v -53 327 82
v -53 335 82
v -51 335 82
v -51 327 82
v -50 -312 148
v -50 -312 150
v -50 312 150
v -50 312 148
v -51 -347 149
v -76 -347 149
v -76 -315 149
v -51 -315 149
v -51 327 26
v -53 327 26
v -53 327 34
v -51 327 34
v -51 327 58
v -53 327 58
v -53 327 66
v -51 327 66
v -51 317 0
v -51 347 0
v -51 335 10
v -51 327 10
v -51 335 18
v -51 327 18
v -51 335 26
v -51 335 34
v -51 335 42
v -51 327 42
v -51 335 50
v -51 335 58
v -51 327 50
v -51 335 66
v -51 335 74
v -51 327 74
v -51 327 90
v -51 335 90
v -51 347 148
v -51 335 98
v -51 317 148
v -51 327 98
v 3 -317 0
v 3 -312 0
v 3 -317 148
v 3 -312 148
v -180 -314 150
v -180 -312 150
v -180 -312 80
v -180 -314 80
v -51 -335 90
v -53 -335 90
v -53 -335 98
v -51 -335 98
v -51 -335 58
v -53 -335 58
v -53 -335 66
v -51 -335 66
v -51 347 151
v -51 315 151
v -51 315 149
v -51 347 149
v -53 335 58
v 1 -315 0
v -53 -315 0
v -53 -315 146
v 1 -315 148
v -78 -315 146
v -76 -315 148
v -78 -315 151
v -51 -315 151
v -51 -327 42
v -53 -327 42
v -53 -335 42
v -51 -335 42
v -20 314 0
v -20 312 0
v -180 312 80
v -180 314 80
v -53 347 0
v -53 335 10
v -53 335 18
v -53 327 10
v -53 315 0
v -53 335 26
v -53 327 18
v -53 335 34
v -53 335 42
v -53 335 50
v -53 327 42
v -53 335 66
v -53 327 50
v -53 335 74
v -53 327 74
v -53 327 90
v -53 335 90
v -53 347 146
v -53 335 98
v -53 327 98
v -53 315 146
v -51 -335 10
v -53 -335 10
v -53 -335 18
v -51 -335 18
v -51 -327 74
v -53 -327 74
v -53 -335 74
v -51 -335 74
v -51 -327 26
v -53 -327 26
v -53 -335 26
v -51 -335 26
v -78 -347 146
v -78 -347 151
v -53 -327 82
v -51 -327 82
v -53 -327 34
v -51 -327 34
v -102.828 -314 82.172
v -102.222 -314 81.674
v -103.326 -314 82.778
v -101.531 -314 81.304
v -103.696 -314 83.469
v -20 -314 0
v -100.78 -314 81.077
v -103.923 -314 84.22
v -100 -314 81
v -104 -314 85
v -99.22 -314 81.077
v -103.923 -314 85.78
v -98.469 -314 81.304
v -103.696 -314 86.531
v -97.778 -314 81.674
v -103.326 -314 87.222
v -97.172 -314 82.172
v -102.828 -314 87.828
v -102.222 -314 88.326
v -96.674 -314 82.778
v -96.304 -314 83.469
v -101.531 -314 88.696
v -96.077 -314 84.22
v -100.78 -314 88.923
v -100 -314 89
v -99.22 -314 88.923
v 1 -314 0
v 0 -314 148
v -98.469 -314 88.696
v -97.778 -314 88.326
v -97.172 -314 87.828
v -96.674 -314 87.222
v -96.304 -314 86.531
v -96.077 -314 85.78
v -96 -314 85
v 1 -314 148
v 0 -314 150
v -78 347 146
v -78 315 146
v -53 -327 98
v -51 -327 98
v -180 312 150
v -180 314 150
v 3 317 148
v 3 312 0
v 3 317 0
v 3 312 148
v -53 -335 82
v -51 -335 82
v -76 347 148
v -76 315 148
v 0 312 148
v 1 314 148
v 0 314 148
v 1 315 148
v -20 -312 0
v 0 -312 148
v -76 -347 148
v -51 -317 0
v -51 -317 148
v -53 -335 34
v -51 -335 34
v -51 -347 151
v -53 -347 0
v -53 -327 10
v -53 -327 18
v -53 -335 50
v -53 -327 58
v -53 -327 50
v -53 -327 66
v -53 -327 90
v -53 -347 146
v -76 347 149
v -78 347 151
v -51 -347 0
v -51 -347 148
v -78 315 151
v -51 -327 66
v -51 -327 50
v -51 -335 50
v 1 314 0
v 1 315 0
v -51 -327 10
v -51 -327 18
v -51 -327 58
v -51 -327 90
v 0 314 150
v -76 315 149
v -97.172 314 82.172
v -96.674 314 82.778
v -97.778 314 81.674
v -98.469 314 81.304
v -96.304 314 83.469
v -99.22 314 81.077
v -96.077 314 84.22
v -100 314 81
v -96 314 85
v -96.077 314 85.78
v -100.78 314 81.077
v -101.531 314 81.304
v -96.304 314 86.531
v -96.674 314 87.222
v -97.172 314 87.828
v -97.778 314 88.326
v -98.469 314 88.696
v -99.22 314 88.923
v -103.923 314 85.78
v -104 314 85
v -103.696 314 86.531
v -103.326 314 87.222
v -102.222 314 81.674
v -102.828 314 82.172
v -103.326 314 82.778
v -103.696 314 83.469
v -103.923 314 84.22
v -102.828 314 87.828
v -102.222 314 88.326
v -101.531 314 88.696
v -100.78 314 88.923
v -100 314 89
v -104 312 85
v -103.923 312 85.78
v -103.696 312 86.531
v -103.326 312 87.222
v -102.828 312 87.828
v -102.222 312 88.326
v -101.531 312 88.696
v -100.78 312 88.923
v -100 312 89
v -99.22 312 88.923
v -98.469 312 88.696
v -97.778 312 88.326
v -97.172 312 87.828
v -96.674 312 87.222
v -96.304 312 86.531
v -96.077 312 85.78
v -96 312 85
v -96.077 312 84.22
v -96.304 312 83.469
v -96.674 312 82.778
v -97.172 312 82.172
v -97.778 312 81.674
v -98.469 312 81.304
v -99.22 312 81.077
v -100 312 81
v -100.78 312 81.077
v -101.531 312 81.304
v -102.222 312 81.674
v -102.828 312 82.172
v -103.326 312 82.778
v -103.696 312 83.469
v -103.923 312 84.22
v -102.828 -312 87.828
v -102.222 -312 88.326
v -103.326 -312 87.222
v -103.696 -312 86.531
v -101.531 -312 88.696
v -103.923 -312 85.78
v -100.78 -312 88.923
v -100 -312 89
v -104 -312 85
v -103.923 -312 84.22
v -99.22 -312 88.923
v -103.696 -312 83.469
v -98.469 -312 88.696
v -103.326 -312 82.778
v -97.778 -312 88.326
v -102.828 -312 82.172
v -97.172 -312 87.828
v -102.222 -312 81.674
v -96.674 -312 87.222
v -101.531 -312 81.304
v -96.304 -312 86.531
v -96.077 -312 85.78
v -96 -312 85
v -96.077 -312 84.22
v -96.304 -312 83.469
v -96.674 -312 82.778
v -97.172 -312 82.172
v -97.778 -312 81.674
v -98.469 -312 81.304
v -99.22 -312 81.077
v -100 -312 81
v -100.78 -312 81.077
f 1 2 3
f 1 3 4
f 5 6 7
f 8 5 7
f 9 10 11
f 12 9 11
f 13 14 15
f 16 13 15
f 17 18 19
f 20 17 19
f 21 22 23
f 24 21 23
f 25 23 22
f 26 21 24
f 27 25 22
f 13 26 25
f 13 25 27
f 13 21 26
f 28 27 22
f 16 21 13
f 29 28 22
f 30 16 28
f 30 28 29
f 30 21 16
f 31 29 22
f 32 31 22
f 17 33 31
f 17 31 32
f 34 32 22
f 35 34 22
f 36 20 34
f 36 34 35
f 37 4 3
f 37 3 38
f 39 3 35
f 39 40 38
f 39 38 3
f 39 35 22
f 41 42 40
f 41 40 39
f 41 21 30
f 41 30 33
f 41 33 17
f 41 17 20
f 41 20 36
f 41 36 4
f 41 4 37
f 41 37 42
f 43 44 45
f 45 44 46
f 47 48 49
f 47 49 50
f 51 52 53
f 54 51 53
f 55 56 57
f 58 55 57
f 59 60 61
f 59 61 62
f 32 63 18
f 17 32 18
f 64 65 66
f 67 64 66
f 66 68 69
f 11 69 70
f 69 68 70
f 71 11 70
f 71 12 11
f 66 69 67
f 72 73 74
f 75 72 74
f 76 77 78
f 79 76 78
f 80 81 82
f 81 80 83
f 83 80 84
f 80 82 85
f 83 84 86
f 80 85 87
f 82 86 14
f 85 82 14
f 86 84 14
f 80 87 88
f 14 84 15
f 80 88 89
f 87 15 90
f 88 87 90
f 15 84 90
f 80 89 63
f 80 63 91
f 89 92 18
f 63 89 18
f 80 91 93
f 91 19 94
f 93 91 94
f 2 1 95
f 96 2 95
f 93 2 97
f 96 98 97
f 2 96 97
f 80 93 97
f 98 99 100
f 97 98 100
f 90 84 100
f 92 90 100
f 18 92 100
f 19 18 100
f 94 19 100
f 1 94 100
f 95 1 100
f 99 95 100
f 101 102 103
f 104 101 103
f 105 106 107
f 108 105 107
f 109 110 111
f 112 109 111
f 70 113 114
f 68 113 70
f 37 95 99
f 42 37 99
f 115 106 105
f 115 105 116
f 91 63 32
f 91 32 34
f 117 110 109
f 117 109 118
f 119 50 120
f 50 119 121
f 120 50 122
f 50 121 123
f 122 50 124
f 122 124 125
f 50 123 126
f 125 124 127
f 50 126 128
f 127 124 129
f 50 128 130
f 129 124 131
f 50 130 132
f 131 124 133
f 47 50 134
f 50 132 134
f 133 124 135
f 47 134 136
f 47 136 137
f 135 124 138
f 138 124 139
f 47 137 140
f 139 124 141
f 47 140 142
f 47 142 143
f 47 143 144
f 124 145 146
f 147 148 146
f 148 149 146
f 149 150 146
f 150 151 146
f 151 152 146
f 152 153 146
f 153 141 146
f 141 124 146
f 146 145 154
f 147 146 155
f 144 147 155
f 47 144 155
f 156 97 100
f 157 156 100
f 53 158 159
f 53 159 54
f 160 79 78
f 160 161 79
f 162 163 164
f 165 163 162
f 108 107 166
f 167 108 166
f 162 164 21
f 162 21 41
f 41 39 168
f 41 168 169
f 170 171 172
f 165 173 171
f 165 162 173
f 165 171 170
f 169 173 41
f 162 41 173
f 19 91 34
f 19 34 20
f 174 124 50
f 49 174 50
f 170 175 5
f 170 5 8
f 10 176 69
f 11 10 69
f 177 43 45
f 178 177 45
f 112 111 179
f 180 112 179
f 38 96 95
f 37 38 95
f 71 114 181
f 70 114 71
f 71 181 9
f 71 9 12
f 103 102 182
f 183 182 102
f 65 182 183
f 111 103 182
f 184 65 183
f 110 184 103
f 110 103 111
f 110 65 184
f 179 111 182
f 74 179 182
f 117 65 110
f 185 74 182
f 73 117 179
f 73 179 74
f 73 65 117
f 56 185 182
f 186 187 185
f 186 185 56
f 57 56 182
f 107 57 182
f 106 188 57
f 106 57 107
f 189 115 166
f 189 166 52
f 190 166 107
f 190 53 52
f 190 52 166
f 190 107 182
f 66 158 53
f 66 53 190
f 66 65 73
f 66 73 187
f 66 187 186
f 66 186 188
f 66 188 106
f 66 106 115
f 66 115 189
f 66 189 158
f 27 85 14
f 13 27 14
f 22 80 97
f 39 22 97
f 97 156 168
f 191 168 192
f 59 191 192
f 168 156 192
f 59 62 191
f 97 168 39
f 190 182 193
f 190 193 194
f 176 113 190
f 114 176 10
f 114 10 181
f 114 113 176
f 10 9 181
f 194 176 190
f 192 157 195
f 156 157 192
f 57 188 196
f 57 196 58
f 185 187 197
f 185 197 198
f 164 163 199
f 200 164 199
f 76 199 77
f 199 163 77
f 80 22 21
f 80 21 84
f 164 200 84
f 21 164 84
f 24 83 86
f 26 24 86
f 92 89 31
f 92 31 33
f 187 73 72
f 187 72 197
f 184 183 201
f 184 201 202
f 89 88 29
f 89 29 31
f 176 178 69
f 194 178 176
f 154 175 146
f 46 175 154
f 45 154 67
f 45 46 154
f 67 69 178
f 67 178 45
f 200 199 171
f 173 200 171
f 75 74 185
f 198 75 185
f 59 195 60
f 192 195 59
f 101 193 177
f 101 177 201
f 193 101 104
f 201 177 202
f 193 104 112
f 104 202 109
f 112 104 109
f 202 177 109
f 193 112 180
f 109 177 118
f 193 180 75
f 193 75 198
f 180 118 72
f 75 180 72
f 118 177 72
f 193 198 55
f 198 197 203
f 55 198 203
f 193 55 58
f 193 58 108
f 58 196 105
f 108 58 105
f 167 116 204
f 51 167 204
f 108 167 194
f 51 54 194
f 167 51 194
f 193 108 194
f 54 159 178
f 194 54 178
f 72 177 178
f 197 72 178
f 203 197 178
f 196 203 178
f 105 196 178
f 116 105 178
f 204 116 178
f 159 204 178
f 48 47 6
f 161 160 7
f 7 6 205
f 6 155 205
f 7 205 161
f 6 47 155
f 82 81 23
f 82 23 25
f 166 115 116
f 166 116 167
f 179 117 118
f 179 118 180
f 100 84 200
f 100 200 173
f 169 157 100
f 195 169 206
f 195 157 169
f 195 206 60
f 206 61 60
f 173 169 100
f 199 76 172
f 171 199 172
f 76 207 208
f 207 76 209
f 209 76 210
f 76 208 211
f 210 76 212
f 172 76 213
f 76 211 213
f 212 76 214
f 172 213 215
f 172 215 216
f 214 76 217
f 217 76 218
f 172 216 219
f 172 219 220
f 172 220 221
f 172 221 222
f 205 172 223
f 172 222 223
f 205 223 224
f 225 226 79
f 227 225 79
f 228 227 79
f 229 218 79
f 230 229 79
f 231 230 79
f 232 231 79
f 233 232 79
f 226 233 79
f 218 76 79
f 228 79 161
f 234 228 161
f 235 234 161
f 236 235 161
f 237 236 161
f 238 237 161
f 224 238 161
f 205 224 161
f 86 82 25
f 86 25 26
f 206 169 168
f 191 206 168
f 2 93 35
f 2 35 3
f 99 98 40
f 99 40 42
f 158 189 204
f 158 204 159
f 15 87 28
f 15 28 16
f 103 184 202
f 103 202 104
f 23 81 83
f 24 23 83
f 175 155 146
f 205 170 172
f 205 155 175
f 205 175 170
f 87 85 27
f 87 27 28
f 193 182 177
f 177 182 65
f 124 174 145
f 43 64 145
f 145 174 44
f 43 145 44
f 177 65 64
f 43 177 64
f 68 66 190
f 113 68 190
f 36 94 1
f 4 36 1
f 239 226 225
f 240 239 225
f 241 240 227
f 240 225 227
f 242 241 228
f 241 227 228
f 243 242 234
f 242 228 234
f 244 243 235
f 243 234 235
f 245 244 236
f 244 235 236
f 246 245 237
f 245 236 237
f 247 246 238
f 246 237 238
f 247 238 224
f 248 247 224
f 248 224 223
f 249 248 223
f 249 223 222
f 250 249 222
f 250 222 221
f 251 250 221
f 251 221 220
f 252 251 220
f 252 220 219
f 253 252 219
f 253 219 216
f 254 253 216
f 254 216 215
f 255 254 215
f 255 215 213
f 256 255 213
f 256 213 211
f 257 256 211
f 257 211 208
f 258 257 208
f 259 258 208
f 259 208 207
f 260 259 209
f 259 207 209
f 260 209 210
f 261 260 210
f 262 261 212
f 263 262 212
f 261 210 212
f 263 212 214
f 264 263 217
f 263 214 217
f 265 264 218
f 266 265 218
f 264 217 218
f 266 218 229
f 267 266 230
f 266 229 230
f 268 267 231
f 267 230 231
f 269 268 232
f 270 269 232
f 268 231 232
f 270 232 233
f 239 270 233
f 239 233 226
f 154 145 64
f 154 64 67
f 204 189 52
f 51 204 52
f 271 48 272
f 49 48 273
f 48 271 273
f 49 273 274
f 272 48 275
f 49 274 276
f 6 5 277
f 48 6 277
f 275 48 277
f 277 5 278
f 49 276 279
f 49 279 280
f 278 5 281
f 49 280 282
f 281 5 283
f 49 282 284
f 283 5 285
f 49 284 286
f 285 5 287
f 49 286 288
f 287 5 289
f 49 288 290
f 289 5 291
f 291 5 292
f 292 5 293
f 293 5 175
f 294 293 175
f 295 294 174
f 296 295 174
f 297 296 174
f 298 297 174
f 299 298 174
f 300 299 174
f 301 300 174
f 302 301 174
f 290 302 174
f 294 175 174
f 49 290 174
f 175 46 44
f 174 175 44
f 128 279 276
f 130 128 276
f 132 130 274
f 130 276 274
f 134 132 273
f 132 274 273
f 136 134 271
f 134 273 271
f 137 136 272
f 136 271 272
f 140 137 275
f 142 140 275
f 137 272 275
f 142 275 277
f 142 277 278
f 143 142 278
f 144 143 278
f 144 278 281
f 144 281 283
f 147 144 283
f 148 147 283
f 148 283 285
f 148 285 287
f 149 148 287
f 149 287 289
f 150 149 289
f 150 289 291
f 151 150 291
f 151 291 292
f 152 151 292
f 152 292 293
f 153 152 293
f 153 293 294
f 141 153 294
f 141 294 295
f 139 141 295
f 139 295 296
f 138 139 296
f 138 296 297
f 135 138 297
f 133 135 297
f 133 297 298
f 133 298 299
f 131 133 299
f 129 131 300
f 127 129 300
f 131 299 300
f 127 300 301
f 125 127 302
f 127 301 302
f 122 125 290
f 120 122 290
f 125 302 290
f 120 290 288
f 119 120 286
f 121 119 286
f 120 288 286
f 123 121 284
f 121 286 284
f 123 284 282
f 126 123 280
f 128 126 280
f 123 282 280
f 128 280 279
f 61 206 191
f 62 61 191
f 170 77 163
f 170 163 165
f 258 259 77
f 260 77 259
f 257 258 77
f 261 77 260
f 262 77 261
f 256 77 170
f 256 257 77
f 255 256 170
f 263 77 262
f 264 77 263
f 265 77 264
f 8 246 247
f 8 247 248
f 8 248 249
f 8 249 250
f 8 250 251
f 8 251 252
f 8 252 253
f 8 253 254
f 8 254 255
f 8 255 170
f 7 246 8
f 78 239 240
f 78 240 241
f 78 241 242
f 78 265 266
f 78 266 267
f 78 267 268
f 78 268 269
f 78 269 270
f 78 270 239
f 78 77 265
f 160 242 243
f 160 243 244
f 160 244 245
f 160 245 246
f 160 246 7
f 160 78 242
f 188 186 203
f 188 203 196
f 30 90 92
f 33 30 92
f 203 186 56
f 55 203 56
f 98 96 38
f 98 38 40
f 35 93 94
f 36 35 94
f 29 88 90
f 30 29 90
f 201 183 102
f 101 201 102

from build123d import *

# Parameters (mm, degrees)
F0_W      = 2
F0_H      = 148
F1_DEPTH  = 50
F3_DEPTH  = 130
F4_W      = 2
F4_H      = 148
F5_DEPTH  = 3
F6_W      = 2
F6_H      = 148
F7_DEPTH  = 5
F8_W      = 2
F8_H      = 148
F9_DEPTH  = 54
F10_W     = 2
F10_H     = 148
F11_DEPTH = 30
F13_DEPTH = 761
F14_W     = 2
F14_H     = 148
F15_DEPTH = 3
F16_W     = 2
F16_H     = 148
F17_DEPTH = 54
F18_W     = 2
F18_H     = 148
F19_DEPTH = 30
F20_W     = 32
F20_H     = 2
F21_DEPTH = 25
F22_W     = 2
F22_H     = 32
F23_DEPTH = 3
F24_W     = 32
F24_H     = 2
F25_DEPTH = 25
F26_W     = 8
F26_H     = 8
F27_DEPTH = 25
F28_W     = 32
F28_H     = 2
F29_DEPTH = 25
F30_W     = 2
F30_H     = 32
F31_DEPTH = 3
F32_W     = 32
F32_H     = 2
F33_DEPTH = 25
F34_W     = 8
F34_H     = 8
F35_DEPTH = 25
F37_D     = 8


with BuildPart() as f1:
    # F0 (on Right) → F1 (new body)
    with BuildSketch(Plane.YZ):
        Polygon((314, 150), (-314, 150), (-314, 148), (-312, 148), (312, 148), (314, 148), align=None)
        with Locations((313, 74)):
            Rectangle(F0_W, F0_H)
        with Locations((-313, 74)):
            Rectangle(F0_W, F0_H)
    extrude(amount=-F1_DEPTH)

    # F2 (on face) → F3 (join)
    with BuildSketch(Plane(origin=(-50, 0, 0), x_dir=(0, -1, 0), z_dir=(-1, 0, 0))):
        Polygon((312, 0), (314, 0), (314, 150), (312, 150), (312, 148), align=None)
        Polygon((-312, 0), (-312, 148), (-312, 150), (-314, 150), (-314, 0), align=None)
    extrude(amount=F3_DEPTH)

    # F4 (on face) → F5 (join)
    with BuildSketch(Plane.YZ):
        with Locations((313, 74)):
            Rectangle(F4_W, F4_H)
        with Locations((-313, 74)):
            Rectangle(F4_W, F4_H)
    extrude(amount=F5_DEPTH)

    # F6 (on face) → F7 (join)
    with BuildSketch(Plane(origin=(0, -312, 0), x_dir=(-1, 0, 0), z_dir=(0, 1, 0))):
        with Locations((-2, 74)):
            Rectangle(F6_W, F6_H)
    extrude(amount=-F7_DEPTH)

    # F8 (on face) → F9 (join)
    with BuildSketch(Plane(origin=(1, 0, 0), x_dir=(0, -1, 0), z_dir=(-1, 0, 0))):
        with Locations((316, 74)):
            Rectangle(F8_W, F8_H)
    extrude(amount=F9_DEPTH)

    # F10 (on face) → F11 (join)
    with BuildSketch(Plane.XZ.offset(317)):
        with Locations((-52, 74)):
            Rectangle(F10_W, F10_H)
    extrude(amount=F11_DEPTH)

    # F12 (on face) → F13 (cut)
    with BuildSketch(Plane.XZ.offset(314)):
        Polygon((-180, 0), (-20, 0), (-180, 80), align=None)
    extrude(amount=-F13_DEPTH, mode=Mode.SUBTRACT)

    # F14 (on face) → F15 (join)
    with BuildSketch(Plane(origin=(0, 314, 0), x_dir=(-1, 0, 0), z_dir=(0, 1, 0))):
        with Locations((-2, 74)):
            Rectangle(F14_W, F14_H)
    extrude(amount=F15_DEPTH)

    # F16 (on face) → F17 (join)
    with BuildSketch(Plane(origin=(1, 0, 0), x_dir=(0, -1, 0), z_dir=(-1, 0, 0))):
        with Locations((-316, 74)):
            Rectangle(F16_W, F16_H)
    extrude(amount=F17_DEPTH)

    # F18 (on face) → F19 (join)
    with BuildSketch(Plane(origin=(0, 317, 0), x_dir=(-1, 0, 0), z_dir=(0, 1, 0))):
        with Locations((52, 74)):
            Rectangle(F18_W, F18_H)
    extrude(amount=F19_DEPTH)

    # F20 (on face) → F21 (join)
    with BuildSketch(Plane(origin=(-53, 0, 0), x_dir=(0, -1, 0), z_dir=(-1, 0, 0))):
        with Locations((-331, 147)):
            Rectangle(F20_W, F20_H)
    extrude(amount=F21_DEPTH)

    # F22 (on face) → F23 (join)
    with BuildSketch(Plane.XY.offset(148)):
        with Locations((-77, 331)):
            Rectangle(F22_W, F22_H)
    extrude(amount=F23_DEPTH)

    # F24 (on face) → F25 (join)
    with BuildSketch(Plane.YZ.offset(-76)):
        with Locations((331, 150)):
            Rectangle(F24_W, F24_H)
    extrude(amount=F25_DEPTH)

    # F26 (on face) → F27 (cut)
    with BuildSketch(Plane(origin=(-53, 0, 0), x_dir=(0, -1, 0), z_dir=(-1, 0, 0))):
        with Locations((-331, 94)):
            Rectangle(F26_W, F26_H)
        with Locations((-331, 78)):
            Rectangle(F26_W, F26_H)
        with Locations((-331, 62)):
            Rectangle(F26_W, F26_H)
        with Locations((-331, 46)):
            Rectangle(F26_W, F26_H)
        with Locations((-331, 30)):
            Rectangle(F26_W, F26_H)
        with Locations((-331, 14)):
            Rectangle(F26_W, F26_H)
    extrude(amount=-F27_DEPTH, mode=Mode.SUBTRACT)

    # F28 (on face) → F29 (join)
    with BuildSketch(Plane(origin=(-53, 0, 0), x_dir=(0, -1, 0), z_dir=(-1, 0, 0))):
        with Locations((331, 147)):
            Rectangle(F28_W, F28_H)
    extrude(amount=F29_DEPTH)

    # F30 (on face) → F31 (join)
    with BuildSketch(Plane.XY.offset(148)):
        with Locations((-77, -331)):
            Rectangle(F30_W, F30_H)
    extrude(amount=F31_DEPTH)

    # F32 (on face) → F33 (join)
    with BuildSketch(Plane.YZ.offset(-76)):
        with Locations((-331, 150)):
            Rectangle(F32_W, F32_H)
    extrude(amount=F33_DEPTH)

    # F34 (on face) → F35 (cut)
    with BuildSketch(Plane(origin=(-53, 0, 0), x_dir=(0, -1, 0), z_dir=(-1, 0, 0))):
        with Locations((331, 78)):
            Rectangle(F34_W, F34_H)
        with Locations((331, 62)):
            Rectangle(F34_W, F34_H)
        with Locations((331, 46)):
            Rectangle(F34_W, F34_H)
        with Locations((331, 30)):
            Rectangle(F34_W, F34_H)
        with Locations((331, 14)):
            Rectangle(F34_W, F34_H)
        with Locations((331, 94)):
            Rectangle(F34_W, F34_H)
    extrude(amount=-F35_DEPTH, mode=Mode.SUBTRACT)

    # F37 (through all)
    with Locations(Plane.XZ.offset(314)):
        with Locations((-100, 85)):
            Hole(F37_D / 2)


solid = f1.part
